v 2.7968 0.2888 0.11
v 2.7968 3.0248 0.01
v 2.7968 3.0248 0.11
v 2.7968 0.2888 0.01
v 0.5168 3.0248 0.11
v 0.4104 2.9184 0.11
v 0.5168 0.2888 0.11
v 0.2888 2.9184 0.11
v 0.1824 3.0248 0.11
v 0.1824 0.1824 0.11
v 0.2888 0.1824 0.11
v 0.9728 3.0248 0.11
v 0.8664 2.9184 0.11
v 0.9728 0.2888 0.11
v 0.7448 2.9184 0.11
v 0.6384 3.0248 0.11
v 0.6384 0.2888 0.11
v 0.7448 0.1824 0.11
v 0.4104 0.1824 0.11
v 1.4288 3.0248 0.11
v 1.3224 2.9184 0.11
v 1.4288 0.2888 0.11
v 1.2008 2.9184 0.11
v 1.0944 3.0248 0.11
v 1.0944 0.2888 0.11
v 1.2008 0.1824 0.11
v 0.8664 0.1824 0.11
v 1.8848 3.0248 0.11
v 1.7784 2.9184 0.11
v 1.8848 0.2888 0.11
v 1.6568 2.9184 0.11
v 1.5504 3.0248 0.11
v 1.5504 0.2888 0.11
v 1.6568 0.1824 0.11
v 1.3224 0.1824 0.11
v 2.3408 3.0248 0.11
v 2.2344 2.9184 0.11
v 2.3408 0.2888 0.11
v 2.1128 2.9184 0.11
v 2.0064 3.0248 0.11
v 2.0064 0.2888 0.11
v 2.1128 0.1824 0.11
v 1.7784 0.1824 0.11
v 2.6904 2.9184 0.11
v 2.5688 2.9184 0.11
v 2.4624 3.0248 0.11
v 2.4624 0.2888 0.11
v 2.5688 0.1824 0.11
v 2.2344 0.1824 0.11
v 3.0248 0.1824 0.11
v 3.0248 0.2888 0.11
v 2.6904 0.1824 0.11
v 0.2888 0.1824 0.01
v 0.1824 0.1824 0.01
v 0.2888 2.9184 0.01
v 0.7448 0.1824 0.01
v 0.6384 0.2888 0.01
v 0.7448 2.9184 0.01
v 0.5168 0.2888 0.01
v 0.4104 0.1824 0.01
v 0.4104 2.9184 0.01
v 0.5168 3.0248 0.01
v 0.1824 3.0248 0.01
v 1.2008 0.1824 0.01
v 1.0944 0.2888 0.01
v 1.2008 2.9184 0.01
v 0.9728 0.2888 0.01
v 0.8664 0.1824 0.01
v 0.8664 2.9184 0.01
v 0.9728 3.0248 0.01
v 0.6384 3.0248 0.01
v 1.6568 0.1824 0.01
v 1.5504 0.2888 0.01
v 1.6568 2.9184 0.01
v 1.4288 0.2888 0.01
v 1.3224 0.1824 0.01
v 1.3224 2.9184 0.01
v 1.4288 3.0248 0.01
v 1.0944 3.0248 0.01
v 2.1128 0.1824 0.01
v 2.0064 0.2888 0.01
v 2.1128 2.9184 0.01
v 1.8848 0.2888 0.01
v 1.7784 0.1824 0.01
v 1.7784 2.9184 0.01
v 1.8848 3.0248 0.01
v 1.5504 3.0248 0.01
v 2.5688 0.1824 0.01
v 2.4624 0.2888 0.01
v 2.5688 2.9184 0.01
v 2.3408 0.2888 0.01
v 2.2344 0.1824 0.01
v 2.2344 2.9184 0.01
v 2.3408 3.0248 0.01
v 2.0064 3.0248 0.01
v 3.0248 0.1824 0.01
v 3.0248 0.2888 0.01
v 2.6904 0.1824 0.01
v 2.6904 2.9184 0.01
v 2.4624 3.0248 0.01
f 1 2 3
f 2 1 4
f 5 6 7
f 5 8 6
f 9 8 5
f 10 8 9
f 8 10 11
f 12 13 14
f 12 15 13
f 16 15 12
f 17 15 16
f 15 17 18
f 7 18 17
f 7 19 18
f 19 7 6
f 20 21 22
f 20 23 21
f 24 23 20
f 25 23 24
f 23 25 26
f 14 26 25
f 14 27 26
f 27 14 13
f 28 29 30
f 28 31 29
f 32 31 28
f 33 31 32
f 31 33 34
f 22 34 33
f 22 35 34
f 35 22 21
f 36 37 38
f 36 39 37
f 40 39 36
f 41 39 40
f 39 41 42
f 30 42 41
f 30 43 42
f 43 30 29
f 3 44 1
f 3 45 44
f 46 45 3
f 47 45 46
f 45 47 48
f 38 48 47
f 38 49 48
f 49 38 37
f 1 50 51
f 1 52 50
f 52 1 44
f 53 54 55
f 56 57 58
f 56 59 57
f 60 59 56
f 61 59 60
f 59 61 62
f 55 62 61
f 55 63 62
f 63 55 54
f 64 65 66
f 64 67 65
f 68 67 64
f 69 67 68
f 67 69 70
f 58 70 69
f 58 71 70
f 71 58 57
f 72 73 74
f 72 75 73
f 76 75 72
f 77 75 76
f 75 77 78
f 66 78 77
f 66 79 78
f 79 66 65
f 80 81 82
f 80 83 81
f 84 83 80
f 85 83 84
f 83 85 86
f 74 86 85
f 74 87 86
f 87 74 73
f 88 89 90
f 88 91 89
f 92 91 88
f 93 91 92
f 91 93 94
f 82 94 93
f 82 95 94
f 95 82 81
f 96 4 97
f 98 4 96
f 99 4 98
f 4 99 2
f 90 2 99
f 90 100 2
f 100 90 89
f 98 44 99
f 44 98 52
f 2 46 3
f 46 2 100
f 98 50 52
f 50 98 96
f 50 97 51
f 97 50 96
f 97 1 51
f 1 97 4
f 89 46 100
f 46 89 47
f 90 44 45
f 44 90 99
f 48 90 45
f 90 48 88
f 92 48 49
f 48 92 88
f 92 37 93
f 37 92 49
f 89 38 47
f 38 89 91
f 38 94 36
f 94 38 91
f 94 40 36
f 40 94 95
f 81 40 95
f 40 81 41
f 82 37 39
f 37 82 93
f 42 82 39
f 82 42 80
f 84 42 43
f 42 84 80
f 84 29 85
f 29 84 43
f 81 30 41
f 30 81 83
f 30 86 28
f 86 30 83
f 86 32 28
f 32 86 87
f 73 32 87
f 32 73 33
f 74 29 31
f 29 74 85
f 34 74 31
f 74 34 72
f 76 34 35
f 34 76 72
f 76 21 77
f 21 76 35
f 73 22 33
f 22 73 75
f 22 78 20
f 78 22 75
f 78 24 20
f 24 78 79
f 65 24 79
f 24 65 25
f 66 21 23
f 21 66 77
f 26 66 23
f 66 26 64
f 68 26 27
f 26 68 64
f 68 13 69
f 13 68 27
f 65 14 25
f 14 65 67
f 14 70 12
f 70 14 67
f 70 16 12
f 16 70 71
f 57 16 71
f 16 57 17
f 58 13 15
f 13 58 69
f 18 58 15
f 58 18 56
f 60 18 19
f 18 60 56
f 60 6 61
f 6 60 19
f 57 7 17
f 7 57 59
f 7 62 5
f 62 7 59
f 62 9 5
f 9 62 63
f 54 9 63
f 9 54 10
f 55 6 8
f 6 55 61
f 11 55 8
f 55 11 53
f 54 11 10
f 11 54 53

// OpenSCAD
use <routing.scad>

px = 7.6e-3;
layer = 10e-3;
lpv = 20;

module valve_20px_1(xpos, ypos, zpos, orientation)
{
    
    // Parameteres
    h_fluid = 2*layer;
    t_memb = layer;
    h_air = 4*layer;
    h_total = h_fluid + t_memb + h_air; // 7*layer
    d_valve = 20*px;
    
    // Valve connection channels
    xychan0 = 6*px;
    xychan = 8*px;
    hchan = 5*layer;
    hchan_px = 8*px;
    wchan = 8*px;

    dimm        =   [  
                        [[0, 0], [-wchan/2, wchan/2], [0, hchan]], // 0
                        [[-wchan/2, wchan/2], [0, 0], [0, hchan]], // 1
                        [[-xychan/2, xychan/2], [-xychan/2, xychan/2], [0, 0]], // 2
                        [[-xychan0/2, xychan0/2], [-xychan0/2, xychan0/2], [0, 0]], // 3
                        [[-xychan/2, xychan/2], [0, hchan_px], [0, 0]], // 4
                    ];
                    
    overlap_v_xy  = 2*px;
    
    module obj(){
        // Fluid compartment
        color("CadetBlue")
        cylinder(d = d_valve, h = h_fluid);
        
        // Air compartment
        color("SteelBlue")
        translate([0,0,h_fluid + t_memb])
        cylinder(d = d_valve, h = h_air);    
            
        // Fluid in channel connection
        pt_fluid_in         = [0, -d_valve/2 + overlap_v_xy, 1*layer - hchan];
        pt_fluid_in_next    = [
                                ["+y", -21*px, 1],
                              ];
        color("Blue")
        routing(pt_fluid_in,pt_fluid_in_next, dimm);
        
        // Fluid out channel connection
        pt_fluid_out        = [0, d_valve/2 - overlap_v_xy, 1*layer - hchan];
        pt_fluid_out_next   = [
                                ["+y", 21*px, 1],
                              ];
        color("Red")
        routing(pt_fluid_out,pt_fluid_out_next, dimm);
        
        // Air control channel connection
        pt_air_control      = [-d_valve/2 - xychan/2 + 6*px, 0, h_total];
        pt_air_control_next = [
                                ["+zx", [9*layer, -21*px]],
                              ];
        
        color("Red")
        routing(pt_air_control,pt_air_control_next, dimm);
        
        // Air flushing channel connection
        pt_air_flush        = [d_valve/2 + xychan/2 - 6*px, 0, h_total];
        pt_air_flush_next   = [
                                ["+zx", [9*layer, 21*px]],
                              ];
        color("Blue")
        routing(pt_air_flush,pt_air_flush_next, dimm);
    }
    
    if (orientation == "N"){
        rotate(270)
        translate([-30*px*2 - ypos*px, 30*px*2 + xpos*px, 4*layer + zpos*layer])
        obj();
    }
    if (orientation == "FN"){
        mirror([1, 0 , 0])
        rotate(270)
        translate([-30*px*2 - ypos*px, -30*px*2 - xpos*px, 4*layer + zpos*layer])
        obj();
    }
    if (orientation == "FS"){
        mirror([0, 1, 0])
        rotate(270)
        translate([30*px*2 + ypos*px, 30*px*2 + xpos*px, 4*layer + zpos*layer])
        obj();
    }
    if (orientation == "S"){
        mirror([0, 1, 0])
        mirror([1, 0 , 0])
        rotate(270)
        translate([30*px*2 + ypos*px, -30*px*2 - xpos*px, 4*layer + zpos*layer])
        obj();
    }
    
}
module valve_20px4way_0(xpos, ypos, zpos, orientation)
{
    
    // Parameteres
    h_fluid = 2*layer;
    t_memb = layer;
    h_air = 4*layer;
    h_total = h_fluid + t_memb + h_air; // 7*layer
    d_valve = 20*px;
    
    // Valve connection channels
    xychan0 = 6*px;
    xychan = 8*px;
    hchan = 5*layer;
    hchan_px = 8*px;
    wchan = 8*px;

    dimm        =   [  
                        [[0, 0], [-wchan/2, wchan/2], [0, hchan]], // 0
                        [[-wchan/2, wchan/2], [0, 0], [0, hchan]], // 1
                        [[-xychan/2, xychan/2], [-xychan/2, xychan/2], [0, 0]], // 2
                        [[-xychan0/2, xychan0/2], [-xychan0/2, xychan0/2], [0, 0]], // 3
                        [[-xychan/2, xychan/2], [0, hchan_px], [0, 0]], // 4
                    ];
                    
    overlap_v_xy  = 2*px;
    
    module obj(){
        // Fluid compartment
        color("CadetBlue")
        cylinder(d = d_valve, h = h_fluid);
        
        // Air compartment
        color("SteelBlue")
        translate([0,0,h_fluid + t_memb])
        cylinder(d = d_valve, h = h_air);    
            
        // Fluid in channel connection
        pt_fluid_in         = [0, -d_valve/2 + overlap_v_xy, 1*layer - hchan];
        pt_fluid_in_next    = [
                                ["+y", -21*px, 1],
                              ];
        color("Blue")
        routing(pt_fluid_in,pt_fluid_in_next, dimm);
        
        // Fluid out channel connection
        pt_fluid_out        = [0, d_valve/2 - overlap_v_xy, 1*layer - hchan];
        pt_fluid_out_next   = [
                                ["+y", 21*px, 1],
                              ];
        color("Red")
        routing(pt_fluid_out,pt_fluid_out_next, dimm);
        
        rotate(90){
            // Fluid in channel connection
            pt_fluid_in         =   [0, -d_valve/2 + overlap_v_xy, 1*layer - hchan];
            pt_fluid_in_next    =   [
                                        ["+y", -21*px, 1],
                                    ];
            
            routing(pt_fluid_in,pt_fluid_in_next, dimm);
        
            // Fluid out channel connection
            pt_fluid_out        =   [0, d_valve/2 - overlap_v_xy, 1*layer - hchan];
            pt_fluid_out_next   =   [
                                        ["+y", 21*px, 1],
                                    ];
            
            routing(pt_fluid_out,pt_fluid_out_next, dimm);
        }
        
        // Air control channel connection
        pt_air_control      = [-d_valve/2 - xychan/2 + 6*px, 0, h_total];
        pt_air_control_next = [
                                ["+zx", [9*layer, -21*px]],
                              ];
        
        color("Red")
        routing(pt_air_control,pt_air_control_next, dimm);
        
        // Air flushing channel connection
        pt_air_flush        = [d_valve/2 + xychan/2 - 6*px, 0, h_total];
        pt_air_flush_next   = [
                                ["+zx", [9*layer, 21*px]],
                              ];
        color("Blue")
        routing(pt_air_flush,pt_air_flush_next, dimm);
    }
    
    if (orientation == "N"){
        rotate(270)
        translate([-25*px*2 - ypos*px, 25*px*2 + xpos*px, 4*layer + zpos*layer])
        obj();
    }
    if (orientation == "FN"){
        mirror([1, 0 , 0])
        rotate(270)
        translate([-25*px*2 - ypos*px, -25*px*2 - xpos*px, 4*layer + zpos*layer])
        obj();
    }
    if (orientation == "FS"){
        mirror([0, 1, 0])
        rotate(270)
        translate([25*px*2 + ypos*px, 25*px*2 + xpos*px, 4*layer + zpos*layer])
        obj();
    }
    if (orientation == "S"){
        mirror([0, 1, 0])
        mirror([1, 0 , 0])
        rotate(270)
        translate([25*px*2 + ypos*px, -25*px*2 - xpos*px, 4*layer + zpos*layer])
        obj();
    }
    
}
module serpentine_300px_0(xpos, ypos, zpos, orientation)
{
    
    // Sub-modules
    module obj(){
        translate([23*px, 23*px, 0])       
        routing(
            dimm = [
                    [[0, 0], [0, 14*px], [0, 10*layer]],
                    [[0, 14*px], [0, 0], [0, 10*layer]]
                    ],
            p0 = [0, 0, 0],
            pf = [
                    ["+yx", [360*px, 30*px], [1, 0]],
                    ["+yx", [-360*px, 30*px], [1, 0]],
                    ["+yx", [360*px, 30*px], [1, 0]],
                    ["+yx", [-360*px, 30*px], [1, 0]],
                    ["+yx", [360*px, 30*px], [1, 0]],
                    ["+yx", [-360*px, 30*px], [1, 0]],
                    ["+yx", [360*px, 30*px], [1, 0]],
                    ["+yx", [-360*px, 30*px], [1, 0]],
                    ["+yx", [360*px, 30*px], [1, 0]],
                    ["+yx", [-360*px, 30*px], [1, 0]],
                    ["+yx", [360*px, 30*px], [1, 0]],
                    ["+yx", [-360*px, 30*px+14*px], [1, 0]]
                    ]
        );
        
    }
    
    if (orientation == "N"){
        translate([xpos*px, ypos*px, zpos*layer])
        obj();
    }
        if (orientation == "FN"){
        mirror([1, 0, 0])
        translate([-14*30*px - xpos*px, ypos*px, zpos*layer])
        obj();
    }
    if (orientation == "FS"){
        mirror([0, 1, 0])
        translate([xpos*px, -14*30*px - ypos*px, zpos*layer])
        obj();
    }
    if (orientation == "S"){
        mirror([0, 1, 0])
        mirror([1, 0, 0])
        translate([-14*30*px - xpos*px, -14*30*px - ypos*px, zpos*layer])
        obj();
    }
    
}
serpentine_300px_0(1,1,1,"N");

module serpentine_100px_0(xpos, ypos, zpos, orientation)
{
    
    // Sub-modules
    module obj(){
        translate([23*px, 23*px, 0])       
        routing(
            dimm = [
                    [[0, 0], [0, 14*px], [0, 10*layer]],
                    [[0, 14*px], [0, 0], [0, 10*layer]]
                    ],
            p0 = [0, 0, 0],
            pf = [
                    ["+yx", [120*px, 30*px], [1, 0]],
                    ["+yx", [-120*px, 30*px], [1, 0]],
                    ["+yx", [120*px, 30*px], [1, 0]],
                    ["+yx", [-120*px, 30*px+14*px], [1, 0]]
                    ]
        );
        
    }
    
    if (orientation == "N"){
        translate([xpos*px, ypos*px, zpos*layer])
        obj();
    }
        if (orientation == "FN"){
        mirror([1, 0, 0])
        translate([-6*30*px - xpos*px, ypos*px, zpos*layer])
        obj();
    }
    if (orientation == "FS"){
        mirror([0, 1, 0])
        translate([xpos*px, -6*30*px - ypos*px, zpos*layer])
        obj();
    }
    if (orientation == "S"){
        mirror([0, 1, 0])
        mirror([1, 0, 0])
        translate([-6*30*px - xpos*px, -6*30*px - ypos*px, zpos*layer])
        obj();
    }
    
}
module serpentine_200_100px_0(xpos, ypos, zpos, orientation)
{
    
    // Sub-modules
    module obj(){
        translate([23*px, 23*px, 0])       
        routing(
            dimm = [
                    [[0, 0], [0, 14*px], [0, 10*layer]],
                    [[0, 14*px], [0, 0], [0, 10*layer]]
                    ],
            p0 = [0, 0, 0],
            pf = [
                    ["+yx", [120*px, 30*px], [1, 0]],
                    ["+yx", [-120*px, 30*px], [1, 0]],
                    ["+yx", [120*px, 30*px], [1, 0]],                 
                    ["+yx", [-120*px, 30*px], [1, 0]],
                    ["+yx", [120*px, 30*px], [1, 0]],
                    ["+yx", [-120*px, 30*px], [1, 0]],
                    ["+yx", [120*px, 30*px], [1, 0]],
                    ["+yx", [-120*px, 30*px+14*px], [1, 0]],
                    ]
        );
        
    }
    
    if (orientation == "N"){
        translate([xpos*px, ypos*px, zpos*layer])
        obj();
    }
        if (orientation == "FN"){
        mirror([1, 0, 0])
        translate([-10*30*px - xpos*px, ypos*px, zpos*layer])
        obj();
    }
    if (orientation == "FS"){
        mirror([0, 1, 0])
        translate([xpos*px, -6*30*px - ypos*px, zpos*layer])
        obj();
    }
    if (orientation == "S"){
        mirror([0, 1, 0])
        mirror([1, 0, 0])
        translate([-10*30*px - xpos*px, -6*30*px - ypos*px, zpos*layer])
        obj();
    }
    
}
module serpentine_25px_0(xpos, ypos, zpos, orientation)
{
    
    // Sub-modules
    module obj(){
        translate([23*px, 23*px, 0])       
        routing(
            dimm = [
                    [[0, 0], [0, 14*px], [0, 10*layer]],
                    [[0, 14*px], [0, 0], [0, 10*layer]]
                    ],
            p0 = [0, 0, 0],
            pf = [
                    ["+yx", [30*px, 30*px+14*px], [1, 0]]
                    ]
        );
        
    }
    
    if (orientation == "N"){
        translate([xpos*px, ypos*px, zpos*layer])
        obj();
    }
        if (orientation == "FN"){
        mirror([1, 0, 0])
        translate([-3*30*px - xpos*px, ypos*px, zpos*layer])
        obj();
    }
    if (orientation == "FS"){
        mirror([0, 1, 0])
        translate([xpos*px, -3*30*px - ypos*px, zpos*layer])
        obj();
    }
    if (orientation == "S"){
        mirror([0, 1, 0])
        mirror([1, 0, 0])
        translate([-3*30*px - xpos*px, -3*30*px - ypos*px, zpos*layer])
        obj();
    }
    
}
module serpentine_150px_0(xpos, ypos, zpos, orientation)
{
    
    // Sub-modules
    module obj(){
        translate([23*px, 23*px, 0])       
        routing(
            dimm = [
                    [[0, 0], [0, 14*px], [0, 10*layer]],
                    [[0, 14*px], [0, 0], [0, 10*layer]]
                    ],
            p0 = [0, 0, 0],
            pf = [
                    ["+yx", [180*px, 30*px], [1, 0]],
                    ["+yx", [-180*px, 30*px], [1, 0]],
                    ["+yx", [180*px, 30*px], [1, 0]],
                    ["+yx", [-180*px, 30*px], [1, 0]],
                    ["+yx", [180*px, 30*px], [1, 0]],
                    ["+yx", [-180*px, 30*px+14*px], [1, 0]]
                    ]
        );
        
    }
    
    if (orientation == "N"){
        translate([xpos*px, ypos*px, zpos*layer])
        obj();
    }
        if (orientation == "FN"){
        mirror([1, 0, 0])
        translate([-8*30*px - xpos*px, ypos*px, zpos*layer])
        obj();
    }
    if (orientation == "FS"){
        mirror([0, 1, 0])
        translate([xpos*px, -8*30*px - ypos*px, zpos*layer])
        obj();
    }
    if (orientation == "S"){
        mirror([0, 1, 0])
        mirror([1, 0, 0])
        translate([-8*30*px - xpos*px, -8*30*px - ypos*px, zpos*layer])
        obj();
    }
    
}
module serpentine_200px_0(xpos, ypos, zpos, orientation)
{
    
    // Sub-modules
    module obj(){
        translate([23*px, 23*px, 0])       
        routing(
            dimm = [
                    [[0, 0], [0, 14*px], [0, 10*layer]],
                    [[0, 14*px], [0, 0], [0, 10*layer]]
                    ],
            p0 = [0, 0, 0],
            pf = [
                    ["+yx", [240*px, 30*px], [1, 0]],
                    ["+yx", [-240*px, 30*px], [1, 0]],
                    ["+yx", [240*px, 30*px], [1, 0]],
                    ["+yx", [-240*px, 30*px], [1, 0]],
                    ["+yx", [240*px, 30*px], [1, 0]],
                    ["+yx", [-240*px, 30*px], [1, 0]],
                    ["+yx", [240*px, 30*px], [1, 0]],
                    ["+yx", [-240*px, 30*px+14*px], [1, 0]]
                    ]
        );
        
    }
    
    if (orientation == "N"){
        translate([xpos*px, ypos*px, zpos*layer])
        obj();
    }
        if (orientation == "FN"){
        mirror([1, 0, 0])
        translate([-10*30*px - xpos*px, ypos*px, zpos*layer])
        obj();
    }
    if (orientation == "FS"){
        mirror([0, 1, 0])
        translate([xpos*px, -10*30*px - ypos*px, zpos*layer])
        obj();
    }
    if (orientation == "S"){
        mirror([0, 1, 0])
        mirror([1, 0, 0])
        translate([-10*30*px - xpos*px, -10*30*px - ypos*px, zpos*layer])
        obj();
    }
    
}
module serpentine_300px_4(xpos, ypos, zpos, orientation)
{
    
    // Sub-modules
    module obj(){
        translate([23*px+30*px, 23*px, 0]){     
            routing(
                dimm = [
                        [[0, 0], [0, 14*px], [0, 10*layer]],
                        [[0, 14*px], [0, 0], [0, 10*layer]],
                        [[0, 14*px], [0, 14*px], [0, 0]]
                        ],
                p0 = [-30*px, 0, lpv*layer],
                pf = [
                        ["+x", 30*px, 0],
                        ["+yx", [360*px, 30*px], [1, 0]],
                        ["+yx", [-360*px, 30*px], [1, 0]],
                        ["+yx", [360*px, 30*px], [1, 0]],
                        ["+yx", [-360*px, 30*px], [1, 0]],
                        ["+yx", [360*px, 30*px], [1, 0]],
                        ["+yx", [-360*px, 30*px], [1, 0]],
                        ["+yx", [360*px, 30*px], [1, 0]],
                        ["+yx", [-360*px, 30*px], [1, 0]],
                        ["+yx", [360*px, 30*px], [1, 0]],
                        ["+yx", [-360*px, 30*px], [1, 0]],
                        ["+yx", [360*px, 30*px], [1, 0]],
                        ["+yz", [-360*px, lpv*layer], [1, 2]]
                        ]
            );
            routing(
                dimm = [
                        [[0, 0], [0, 14*px], [0, 10*layer]],
                        [[0, 14*px], [0, 0], [0, 10*layer]],
                        [[0, 14*px], [0, 14*px], [0, 0]]
                        ],
                p0 = [11*30*px, 0, 2*lpv*layer],
                pf = [
                        ["+yx", [360*px, -30*px], [1, 0]],
                        ["+yx", [-360*px, -30*px], [1, 0]],
                        ["+yx", [360*px, -30*px], [1, 0]],
                        ["+yx", [-360*px, -30*px], [1, 0]],
                        ["+yx", [360*px, -30*px], [1, 0]],
                        ["+yx", [-360*px, -30*px], [1, 0]],
                        ["+yx", [360*px, -30*px], [1, 0]],
                        ["+yx", [-360*px, -30*px], [1, 0]],
                        ["+yx", [360*px, -30*px], [1, 0]],
                        ["+yx", [-360*px, -30*px], [1, 0]],
                        ["+yx", [360*px, -30*px], [1, 0]],
                        ["+yz", [-360*px, lpv*layer], [1, 2]]
                        ]
            );
            routing(
                dimm = [
                        [[0, 0], [0, 14*px], [0, 10*layer]],
                        [[0, 14*px], [0, 0], [0, 10*layer]],
                        [[0, 14*px], [0, 14*px], [0, 0]]
                        ],
                p0 = [0, 0, 3*lpv*layer],
                pf = [
                        ["+yx", [360*px, 30*px], [1, 0]],
                        ["+yx", [-360*px, 30*px], [1, 0]],
                        ["+yx", [360*px, 30*px], [1, 0]],
                        ["+yx", [-360*px, 30*px], [1, 0]],
                        ["+yx", [360*px, 30*px], [1, 0]],
                        ["+yx", [-360*px, 30*px], [1, 0]],
                        ["+yx", [360*px, 30*px], [1, 0]],
                        ["+yx", [-360*px, 30*px], [1, 0]],
                        ["+yx", [360*px, 30*px], [1, 0]],
                        ["+yx", [-360*px, 30*px], [1, 0]],
                        ["+yx", [360*px, 30*px], [1, 0]],
                        ["+yz", [-360*px, lpv*layer], [1, 2]]
                        ]
            );
            routing(
                dimm = [
                        [[0, 0], [0, 14*px], [0, 10*layer]],
                        [[0, 14*px], [0, 0], [0, 10*layer]],
                        [[0, 14*px], [0, 14*px], [0, 0]]
                        ],
                p0 = [11*30*px, 0, 4*lpv*layer],
                pf = [
                        ["+yx", [360*px, -30*px], [1, 0]],
                        ["+yx", [-360*px, -30*px], [1, 0]],
                        ["+yx", [360*px, -30*px], [1, 0]],
                        ["+yx", [-360*px, -30*px], [1, 0]],
                        ["+yx", [360*px, -30*px], [1, 0]],
                        ["+yx", [-360*px, -30*px], [1, 0]],
                        ["+yx", [360*px, -30*px], [1, 0]],
                        ["+yx", [-360*px, -30*px], [1, 0]],
                        ["+yx", [360*px, -30*px], [1, 0]],
                        ["+yx", [-360*px, -30*px], [1, 0]],
                        ["+yx", [360*px, -30*px], [1, 0]],
                        ["+yz", [-360*px, lpv*layer], [1, 2]]
                        ]
            );
            routing(
                dimm = [
                        [[0, 0], [0, 14*px], [0, 10*layer]],
                        [[0, 14*px], [0, 0], [0, 10*layer]],
                        [[0, 14*px], [0, 14*px], [0, 0]]
                        ],
                p0 = [0, 0, 5*lpv*layer],
                pf = [
                        ["+yx", [360*px, 30*px], [1, 0]],
                        ["+yx", [-360*px, 30*px], [1, 0]],
                        ["+yx", [360*px, 30*px], [1, 0]],
                        ["+yx", [-360*px, 30*px], [1, 0]],
                        ["+yx", [360*px, 30*px], [1, 0]],
                        ["+yx", [-360*px, 30*px], [1, 0]],
                        ["+yx", [360*px, 30*px], [1, 0]],
                        ["+yx", [-360*px, 30*px], [1, 0]],
                        ["+yx", [360*px, 30*px], [1, 0]],
                        ["+yx", [-360*px, 30*px], [1, 0]],
                        ["+yx", [360*px, 30*px], [1, 0]],
                        ["+yx", [-360*px, 25*px+14*px], [1, 0]]
                        ]
            );
        }
        
    }
    
    if (orientation == "N"){
        translate([xpos*px, ypos*px, zpos*layer])
        obj();
    }
        if (orientation == "FN"){
        mirror([1, 0, 0])
        translate([-15*30*px - xpos*px, ypos*px, zpos*layer])
        obj();
    }
    if (orientation == "FS"){
        mirror([0, 1, 0])
        translate([xpos*px, -14*30*px - ypos*px, zpos*layer])
        obj();
    }
    if (orientation == "S"){
        mirror([0, 1, 0])
        mirror([1, 0, 0])
        translate([-15*30*px - xpos*px, -14*30*px - ypos*px, zpos*layer])
        obj();
    }
    
}
module serpentine_75px_0(xpos, ypos, zpos, orientation)
{
    
    // Sub-modules
    module obj(){
        translate([23*px, 23*px, 0])       
        routing(
            dimm = [
                    [[0, 0], [0, 14*px], [0, 10*layer]],
                    [[0, 14*px], [0, 0], [0, 10*layer]]
                    ],
            p0 = [0, 0, 0],
            pf = [
                    ["+yx", [90*px, 30*px], [1, 0]],
                    ["+yx", [-90*px, 30*px], [1, 0]],
                    ["+yx", [90*px, 30*px+14*px], [1, 0]]
                    ]
        );
        
    }
    
    if (orientation == "N"){
        translate([xpos*px, ypos*px, zpos*layer])
        obj();
    }
        if (orientation == "FN"){
        mirror([1, 0, 0])
        translate([-5*30*px - xpos*px, ypos*px, zpos*layer])
        obj();
    }
    if (orientation == "FS"){
        mirror([0, 1, 0])
        translate([xpos*px, -5*30*px - ypos*px, zpos*layer])
        obj();
    }
    if (orientation == "S"){
        mirror([0, 1, 0])
        mirror([1, 0, 0])
        translate([-5*30*px - xpos*px, -5*30*px - ypos*px, zpos*layer])
        obj();
    }
    
}
module serpentine_300px_1(xpos, ypos, zpos, orientation)
{
    
    // Sub-modules
    module obj(){
        translate([23*px+30*px, 23*px, 0]){     
            routing(
                dimm = [
                        [[0, 0], [0, 14*px], [0, 10*layer]],
                        [[0, 14*px], [0, 0], [0, 10*layer]],
                        [[0, 14*px], [0, 14*px], [0, 0]]
                        ],
                p0 = [0, 0, lpv*layer],
                pf = [
                        ["+yx", [360*px, 30*px], [1, 0]],
                        ["+yx", [-360*px, 30*px], [1, 0]],
                        ["+yx", [360*px, 30*px], [1, 0]],
                        ["+yx", [-360*px, 30*px], [1, 0]],
                        ["+yx", [360*px, 30*px], [1, 0]],
                        ["+yx", [-360*px, 30*px], [1, 0]],
                        ["+yx", [360*px, 30*px], [1, 0]],
                        ["+yx", [-360*px, 30*px], [1, 0]],
                        ["+yx", [360*px, 30*px], [1, 0]],
                        ["+yx", [-360*px, 30*px], [1, 0]],
                        ["+yx", [360*px, 30*px], [1, 0]],
                        ["+yz", [-360*px, lpv*layer], [1, 2]]
                        ]
            );
            routing(
                dimm = [
                        [[0, 0], [0, 14*px], [0, 10*layer]],
                        [[0, 14*px], [0, 0], [0, 10*layer]],
                        [[0, 14*px], [0, 14*px], [0, 0]]
                        ],
                p0 = [11*30*px, 0, 2*lpv*layer],
                pf = [
                        ["+yx", [360*px, -30*px], [1, 0]],
                        ["+yx", [-360*px, -30*px], [1, 0]],
                        ["+yx", [360*px, -30*px], [1, 0]],
                        ["+yx", [-360*px, -30*px], [1, 0]],
                        ["+yx", [360*px, -30*px], [1, 0]],
                        ["+yx", [-360*px, -30*px], [1, 0]],
                        ["+yx", [360*px, -30*px], [1, 0]],
                        ["+yx", [-360*px, -30*px], [1, 0]],
                        ["+yx", [360*px, -30*px], [1, 0]],
                        ["+yx", [-360*px, -30*px], [1, 0]],
                        ["+yx", [360*px, -30*px], [1, 0]],
                        ["+yx", [-360*px, -30*px], [1, 0]]
                        ]
            );
        }
        
    }
    
    if (orientation == "N"){
        translate([xpos*px, ypos*px, zpos*layer])
        obj();
    }
        if (orientation == "FN"){
        mirror([1, 0, 0])
        translate([-14*30*px - xpos*px, ypos*px, zpos*layer])
        obj();
    }
    if (orientation == "FS"){
        mirror([0, 1, 0])
        translate([xpos*px, -14*30*px - ypos*px, zpos*layer])
        obj();
    }
    if (orientation == "S"){
        mirror([0, 1, 0])
        mirror([1, 0, 0])
        translate([-14*30*px - xpos*px, -14*30*px - ypos*px, zpos*layer])
        obj();
    }
    
}
module serpentine_300px_3(xpos, ypos, zpos, orientation)
{
    
    // Sub-modules
    module obj(){
        translate([23*px+30*px, 23*px, 0]){     
            routing(
                dimm = [
                        [[0, 0], [0, 14*px], [0, 10*layer]],
                        [[0, 14*px], [0, 0], [0, 10*layer]],
                        [[0, 14*px], [0, 14*px], [0, 0]]
                        ],
                p0 = [0, 0, lpv*layer],
                pf = [
                        ["+yx", [360*px, 30*px], [1, 0]],
                        ["+yx", [-360*px, 30*px], [1, 0]],
                        ["+yx", [360*px, 30*px], [1, 0]],
                        ["+yx", [-360*px, 30*px], [1, 0]],
                        ["+yx", [360*px, 30*px], [1, 0]],
                        ["+yx", [-360*px, 30*px], [1, 0]],
                        ["+yx", [360*px, 30*px], [1, 0]],
                        ["+yx", [-360*px, 30*px], [1, 0]],
                        ["+yx", [360*px, 30*px], [1, 0]],
                        ["+yx", [-360*px, 30*px], [1, 0]],
                        ["+yx", [360*px, 30*px], [1, 0]],
                        ["+yz", [-360*px, lpv*layer], [1, 2]]
                        ]
            );
            routing(
                dimm = [
                        [[0, 0], [0, 14*px], [0, 10*layer]],
                        [[0, 14*px], [0, 0], [0, 10*layer]],
                        [[0, 14*px], [0, 14*px], [0, 0]]
                        ],
                p0 = [11*30*px, 0, 2*lpv*layer],
                pf = [
                        ["+yx", [360*px, -30*px], [1, 0]],
                        ["+yx", [-360*px, -30*px], [1, 0]],
                        ["+yx", [360*px, -30*px], [1, 0]],
                        ["+yx", [-360*px, -30*px], [1, 0]],
                        ["+yx", [360*px, -30*px], [1, 0]],
                        ["+yx", [-360*px, -30*px], [1, 0]],
                        ["+yx", [360*px, -30*px], [1, 0]],
                        ["+yx", [-360*px, -30*px], [1, 0]],
                        ["+yx", [360*px, -30*px], [1, 0]],
                        ["+yx", [-360*px, -30*px], [1, 0]],
                        ["+yx", [360*px, -30*px], [1, 0]],
                        ["+yz", [-360*px, lpv*layer], [1, 2]]
                        ]
            );
            routing(
                dimm = [
                        [[0, 0], [0, 14*px], [0, 10*layer]],
                        [[0, 14*px], [0, 0], [0, 10*layer]],
                        [[0, 14*px], [0, 14*px], [0, 0]]
                        ],
                p0 = [0, 0, 3*lpv*layer],
                pf = [
                        ["+yx", [360*px, 30*px], [1, 0]],
                        ["+yx", [-360*px, 30*px], [1, 0]],
                        ["+yx", [360*px, 30*px], [1, 0]],
                        ["+yx", [-360*px, 30*px], [1, 0]],
                        ["+yx", [360*px, 30*px], [1, 0]],
                        ["+yx", [-360*px, 30*px], [1, 0]],
                        ["+yx", [360*px, 30*px], [1, 0]],
                        ["+yx", [-360*px, 30*px], [1, 0]],
                        ["+yx", [360*px, 30*px], [1, 0]],
                        ["+yx", [-360*px, 30*px], [1, 0]],
                        ["+yx", [360*px, 30*px], [1, 0]],
                        ["+yz", [-360*px, lpv*layer], [1, 2]]
                        ]
            );
            routing(
                dimm = [
                        [[0, 0], [0, 14*px], [0, 10*layer]],
                        [[0, 14*px], [0, 0], [0, 10*layer]],
                        [[0, 14*px], [0, 14*px], [0, 0]]
                        ],
                p0 = [11*30*px, 0, 4*lpv*layer],
                pf = [
                        ["+yx", [360*px, -30*px], [1, 0]],
                        ["+yx", [-360*px, -30*px], [1, 0]],
                        ["+yx", [360*px, -30*px], [1, 0]],
                        ["+yx", [-360*px, -30*px], [1, 0]],
                        ["+yx", [360*px, -30*px], [1, 0]],
                        ["+yx", [-360*px, -30*px], [1, 0]],
                        ["+yx", [360*px, -30*px], [1, 0]],
                        ["+yx", [-360*px, -30*px], [1, 0]],
                        ["+yx", [360*px, -30*px], [1, 0]],
                        ["+yx", [-360*px, -30*px], [1, 0]],
                        ["+yx", [360*px, -30*px], [1, 0]],
                        ["+yx", [-360*px, -30*px], [1, 0]]
                        ]
            );
        }
        
    }
    
    if (orientation == "N"){
        translate([xpos*px, ypos*px, zpos*layer])
        obj();
    }
        if (orientation == "FN"){
        mirror([1, 0, 0])
        translate([-14*30*px - xpos*px, ypos*px, zpos*layer])
        obj();
    }
    if (orientation == "FS"){
        mirror([0, 1, 0])
        translate([xpos*px, -14*30*px - ypos*px, zpos*layer])
        obj();
    }
    if (orientation == "S"){
        mirror([0, 1, 0])
        mirror([1, 0, 0])
        translate([-14*30*px - xpos*px, -14*30*px - ypos*px, zpos*layer])
        obj();
    }
    
}
module serpentine_50px_0(xpos, ypos, zpos, orientation)
{
    
    // Sub-modules
    module obj(){
        translate([23*px, 23*px, 0])       
        routing(
            dimm = [
                    [[0, 0], [0, 14*px], [0, 10*layer]],
                    [[0, 14*px], [0, 0], [0, 10*layer]]
                    ],
            p0 = [0, 0, 0],
            pf = [
                    ["+yx", [60*px, 30*px], [1, 0]],
                    ["+yx", [-60*px, 30*px+14*px], [1, 0]]
                    ]
        );
        
    }
    
    if (orientation == "N"){
        translate([xpos*px, ypos*px, zpos*layer])
        obj();
    }
        if (orientation == "FN"){
        mirror([1, 0, 0])
        translate([-4*30*px - xpos*px, ypos*px, zpos*layer])
        obj();
    }
    if (orientation == "FS"){
        mirror([0, 1, 0])
        translate([xpos*px, -4*30*px - ypos*px, zpos*layer])
        obj();
    }
    if (orientation == "S"){
        mirror([0, 1, 0])
        mirror([1, 0, 0])
        translate([-4*30*px - xpos*px, -4*30*px - ypos*px, zpos*layer])
        obj();
    }
    
}
module serpentine_300px_2(xpos, ypos, zpos, orientation)
{
    
    // Sub-modules
    module obj(){
        translate([23*px+30*px, 23*px, 0]){     
            routing(
                dimm = [
                        [[0, 0], [0, 14*px], [0, 10*layer]],
                        [[0, 14*px], [0, 0], [0, 10*layer]],
                        [[0, 14*px], [0, 14*px], [0, 0]]
                        ],
                p0 = [-30*px, 0, lpv*layer],
                pf = [
                        ["+x", 30*px, 0],
                        ["+yx", [360*px, 30*px], [1, 0]],
                        ["+yx", [-360*px, 30*px], [1, 0]],
                        ["+yx", [360*px, 30*px], [1, 0]],
                        ["+yx", [-360*px, 30*px], [1, 0]],
                        ["+yx", [360*px, 30*px], [1, 0]],
                        ["+yx", [-360*px, 30*px], [1, 0]],
                        ["+yx", [360*px, 30*px], [1, 0]],
                        ["+yx", [-360*px, 30*px], [1, 0]],
                        ["+yx", [360*px, 30*px], [1, 0]],
                        ["+yx", [-360*px, 30*px], [1, 0]],
                        ["+yx", [360*px, 30*px], [1, 0]],
                        ["+yz", [-360*px, lpv*layer], [1, 2]]
                        ]
            );
            routing(
                dimm = [
                        [[0, 0], [0, 14*px], [0, 10*layer]],
                        [[0, 14*px], [0, 0], [0, 10*layer]],
                        [[0, 14*px], [0, 14*px], [0, 0]]
                        ],
                p0 = [11*30*px, 0, 2*lpv*layer],
                pf = [
                        ["+yx", [360*px, -30*px], [1, 0]],
                        ["+yx", [-360*px, -30*px], [1, 0]],
                        ["+yx", [360*px, -30*px], [1, 0]],
                        ["+yx", [-360*px, -30*px], [1, 0]],
                        ["+yx", [360*px, -30*px], [1, 0]],
                        ["+yx", [-360*px, -30*px], [1, 0]],
                        ["+yx", [360*px, -30*px], [1, 0]],
                        ["+yx", [-360*px, -30*px], [1, 0]],
                        ["+yx", [360*px, -30*px], [1, 0]],
                        ["+yx", [-360*px, -30*px], [1, 0]],
                        ["+yx", [360*px, -30*px], [1, 0]],
                        ["+yz", [-360*px, lpv*layer], [1, 2]]
                        ]
            );
            routing(
                dimm = [
                        [[0, 0], [0, 14*px], [0, 10*layer]],
                        [[0, 14*px], [0, 0], [0, 10*layer]],
                        [[0, 14*px], [0, 14*px], [0, 0]]
                        ],
                p0 = [0, 0, 3*lpv*layer],
                pf = [
                        ["+yx", [360*px, 30*px], [1, 0]],
                        ["+yx", [-360*px, 30*px], [1, 0]],
                        ["+yx", [360*px, 30*px], [1, 0]],
                        ["+yx", [-360*px, 30*px], [1, 0]],
                        ["+yx", [360*px, 30*px], [1, 0]],
                        ["+yx", [-360*px, 30*px], [1, 0]],
                        ["+yx", [360*px, 30*px], [1, 0]],
                        ["+yx", [-360*px, 30*px], [1, 0]],
                        ["+yx", [360*px, 30*px], [1, 0]],
                        ["+yx", [-360*px, 30*px], [1, 0]],
                        ["+yx", [360*px, 30*px], [1, 0]],
                        ["+yx", [-360*px, 30*px+14*px], [1, 0]]
                        ]
            );
        }
        
    }
    
    if (orientation == "N"){
        translate([xpos*px, ypos*px, zpos*layer])
        obj();
    }
        if (orientation == "FN"){
        mirror([1, 0, 0])
        translate([-15*30*px - xpos*px, ypos*px, zpos*layer])
        obj();
    }
    if (orientation == "FS"){
        mirror([0, 1, 0])
        translate([xpos*px, -14*30*px - ypos*px, zpos*layer])
        obj();
    }
    if (orientation == "S"){
        mirror([0, 1, 0])
        mirror([1, 0, 0])
        translate([-15*30*px - xpos*px, -14*30*px - ypos*px, zpos*layer])
        obj();
    }
    
}
module serpentine_200px_3(xpos, ypos, zpos, orientation)
{
    
    // Sub-modules
    module obj(){
        translate([23*px+30*px, 23*px, 0]){      
            routing(
                dimm = [
                        [[0, 0], [0, 14*px], [0, 10*layer]],
                        [[0, 14*px], [0, 0], [0, 10*layer]],
                        [[0, 14*px], [0, 14*px], [0, 0]]
                        ],
                p0 = [-30*px, 0, lpv*layer],
                pf = [
                        ["+x", 30*px, 0],
                        ["+yx", [240*px, 30*px], [1, 0]],
                        ["+yx", [-240*px, 30*px], [1, 0]],
                        ["+yx", [240*px, 30*px], [1, 0]],
                        ["+yx", [-240*px, 30*px], [1, 0]],
                        ["+yx", [240*px, 30*px], [1, 0]],
                        ["+yx", [-240*px, 30*px], [1, 0]],
                        ["+yx", [240*px, 30*px], [1, 0]],
                        ["+yz", [-240*px, lpv*layer], [1, 2]]
                        ]
            );
            routing(
                dimm = [
                        [[0, 0], [0, 14*px], [0, 10*layer]],
                        [[0, 14*px], [0, 0], [0, 10*layer]],
                        [[0, 14*px], [0, 14*px], [0, 0]]
                        ],
                p0 = [7*30*px, 0, 2*lpv*layer],
                pf = [
                        ["+yx", [240*px, -30*px], [1, 0]],
                        ["+yx", [-240*px, -30*px], [1, 0]],
                        ["+yx", [240*px, -30*px], [1, 0]],
                        ["+yx", [-240*px, -30*px], [1, 0]],
                        ["+yx", [240*px, -30*px], [1, 0]],
                        ["+yx", [-240*px, -30*px], [1, 0]],
                        ["+yx", [240*px, -30*px], [1, 0]],
                        ["+yz", [-240*px, lpv*layer], [1, 2]]
                        ]
            );
            routing(
                dimm = [
                        [[0, 0], [0, 14*px], [0, 10*layer]],
                        [[0, 14*px], [0, 0], [0, 10*layer]],
                        [[0, 14*px], [0, 14*px], [0, 0]]
                        ],
                p0 = [0, 0, 3*lpv*layer],
                pf = [
                        ["+yx", [240*px, 30*px], [1, 0]],
                        ["+yx", [-240*px, 30*px], [1, 0]],
                        ["+yx", [240*px, 30*px], [1, 0]],
                        ["+yx", [-240*px, 30*px], [1, 0]],
                        ["+yx", [240*px, 30*px], [1, 0]],
                        ["+yx", [-240*px, 30*px], [1, 0]],
                        ["+yx", [240*px, 30*px], [1, 0]],
                        ["+yz", [-240*px, lpv*layer], [1, 2]]
                        ]
            );
            routing(
                dimm = [
                        [[0, 0], [0, 14*px], [0, 10*layer]],
                        [[0, 14*px], [0, 0], [0, 10*layer]],
                        [[0, 14*px], [0, 14*px], [0, 0]]
                        ],
                p0 = [7*30*px, 0, 4*lpv*layer],
                pf = [
                        ["+yx", [240*px, -30*px], [1, 0]],
                        ["+yx", [-240*px, -30*px], [1, 0]],
                        ["+yx", [240*px, -30*px], [1, 0]],
                        ["+yx", [-240*px, -30*px], [1, 0]],
                        ["+yx", [240*px, -30*px], [1, 0]],
                        ["+yx", [-240*px, -30*px], [1, 0]],
                        ["+yx", [240*px, -30*px], [1, 0]],
                        ["+yx", [-240*px, -30*px], [1, 0]]
                        ]
            );
        }
        
    }
    
    if (orientation == "N"){
        translate([xpos*px, ypos*px, zpos*layer])
        obj();
    }
        if (orientation == "FN"){
        mirror([1, 0, 0])
        translate([-10*30*px - xpos*px, ypos*px, zpos*layer])
        obj();
    }
    if (orientation == "FS"){
        mirror([0, 1, 0])
        translate([xpos*px, -10*30*px - ypos*px, zpos*layer])
        obj();
    }
    if (orientation == "S"){
        mirror([0, 1, 0])
        mirror([1, 0, 0])
        translate([-10*30*px - xpos*px, -10*30*px - ypos*px, zpos*layer])
        obj();
    }
    
}
module diffmix_25px_0(xpos, ypos, zpos, orientation)
{
      
    // Channel Dimensions
    hchan = 10*layer;
    Wchan = 14*px;

    dim  = [
            [[0,0],[-Wchan/2,Wchan/2],[0,hchan]], // 0
            [[-Wchan/2,Wchan/2],[0,0],[0,hchan]], // 1
                    
           ];
    
    module obj(){
        pi_0 = [-7*px, 30*px, 0];
        pf_0 = [Wchan+16*px, 0, 0];
        connect_0 = [
                     ["+x", pf_0, 0]
                    ];
        routing(pi_0, connect_0, dim);
        
        pi_1 = [-7*px, 0*px, 0];
        pf_1 = [Wchan, 0, 0];
        connect_1 = [
                     ["+x", pf_1, 0]
                    ];
        routing(pi_1, connect_1, dim);

        pi_2 = [23*px, 30*px, 0];
        pf_2 = [Wchan, 0, 0];
        connect_2 = [
                     ["+x", pf_2, 0]
                    ];
        routing(pi_2, connect_2, dim);
  
        pi_3 = [0, 0, 0];
        pf_3 = [42.4*px, 0, 0];
        connect_3 = [
                     ["+x", pf_3, 0]
                    ];
        rotate(45)
        routing(pi_3, connect_3, dim);  
        
    }
    
    if (orientation == "N"){
        translate([30*px + xpos*px, 30*px + ypos*px, zpos*layer])
        obj();
    }
    if (orientation == "FN"){
        mirror()
        translate([-2*30*px - xpos*px, 30*px + ypos*px, zpos*layer])
        obj();
    }
    if (orientation == "FS"){
        mirror([0, 1, 0])
        translate([30*px + xpos*px, -2*30*px - ypos*px, zpos*layer])
        obj();
    }
    if (orientation == "S"){
        mirror()
        mirror([0, 1, 0])
        translate([-2*30*px - xpos*px, -2*30*px - ypos*px, zpos*layer])
        obj();
    }
    
}
module junction_25px_0(xpos, ypos, zpos, orientation)
{
      
    // Channel Dimensions
    hchan = 10*layer;
    Wchan = 14*px;

    dim  = [
            [[0,0],[-Wchan/2,Wchan/2],[0,hchan]], // 0
            [[-Wchan/2,Wchan/2],[0,0],[0,hchan]], // 1
                    
           ];
    
    module obj(){
        pi_0 = [-7*px, 25*px, 0];
        pf_0 = [Wchan+11*px, 0, 0];
        connect_0 = [
                     ["+x", pf_0, 0]
                    ];
        routing(pi_0, connect_0, dim);
        
        pi_1 = [-7*px, 0*px, 0];
        pf_1 = [Wchan, 0, 0];
        connect_1 = [
                     ["+x", pf_1, 0]
                    ];
        routing(pi_1, connect_1, dim);

        pi_2 = [18*px, 25*px, 0];
        pf_2 = [Wchan, 0, 0];
        connect_2 = [
                     ["+x", pf_2, 0]
                    ];
        routing(pi_2, connect_2, dim);
  
        pi_3 = [0, 0, 0];
        pf_3 = [35.4*px, 0, 0];
        connect_3 = [
                     ["+x", pf_3, 0]
                    ];
        rotate(45)
        routing(pi_3, connect_3, dim);  
        
    }
    
    if (orientation == "FN"){
        translate([25*px + xpos*px, 25*px + ypos*px, zpos*layer])
        obj();
    }
    if (orientation == "N"){
        mirror()
        translate([-2*25*px - xpos*px, 25*px + ypos*px, zpos*layer])
        obj();
    }
    if (orientation == "S"){
        mirror([0, 1, 0])
        translate([25*px + xpos*px, -2*25*px - ypos*px, zpos*layer])
        obj();
    }
    if (orientation == "FS"){
        mirror()
        mirror([0, 1, 0])
        translate([-2*25*px - xpos*px, -2*25*px - ypos*px, zpos*layer])
        obj();
    }
    
}
module marker(xpos, ypos, zpos)
{
    marker_height = 80*layer;
    marker_diameter = 200*px;
    
    module obj(){
        cylinder(h = marker_height, d = marker_diameter);
    }

    translate([xpos, ypos, zpos]){
        obj();
    }
}
module empty_obj(str_obj)
{
    
}
module pinhole_325px_0(xpos, ypos, zpos, orientation)
{
    
    // Parameters
    d_pin   = 140*px;   // ~= 106*layer = 1.06mm;
    l_pin   = 260*px;   // ~= 2.00mm
    h_cone  = 67*px;    // ~= 0.46mm
    
    module obj(){
        rotate([-90, 0, 0]){
            translate([0, 0, l_pin]){
                cylinder(h = h_cone, d1 = d_pin, d2 = 0);
            }
        cylinder(d = d_pin, h = l_pin);
        }
    }
    
    if (orientation == "bottom"){
        translate([xpos*px, ypos*px, zpos*layer + 5 * layer])
        obj();
    }
    
    if (orientation == "left"){
        rotate([0, 0, -90])
        translate([-ypos*px, xpos*px, zpos*layer + 5 * layer])
        obj();
    }
    
    if (orientation == "top"){
        rotate([0, 0, -180])
        translate([-xpos*px, -ypos*px, zpos*layer + 5 * layer])
        obj();
    }
    
    if (orientation == "right"){
        rotate([0, 0, 90])
        translate([ypos*px, -xpos*px, zpos*layer+ 5 * layer])
        obj();
    }

}
module interconnect_32channel(xpos, ypos, zpos)
{
    gasket_side_length = 40*px;
    gasket_aperture_length = 20*px;
    gasket_height = 1*layer;

    gasket_grid = [2, 2];
    block_gasket_offset = 155*px;
    block_height_default = 200*layer;
    block_long_side = 600*px;
    block_short_side = 399*px;
    gasket_offset = 50*px;

    pedestal_x = 780*px;
    pedestal_y = 380*px;
    pedestal_height = 100*px;

    channel_width_thick = 20 * px;
    channel_width_default = 12*px;

    module zchan(l, xy = channel_width_default) {
        color("lightblue")
        translate([-xy / 2, -xy / 2, 0]) {
            if (l < 0)
                mirror([0, 0, 1])
            cube([xy, xy, -l]);
            else
            cube([xy, xy, l]);
        }
    }

    module gasket(
        gasket_side_length=gasket_side_length, 
        aperture_side_length=gasket_aperture_length, 
        height=gasket_height
        ){

            gasket_width = (gasket_side_length - aperture_side_length)/2;
            difference(){
                cube([gasket_side_length, gasket_side_length, height]);
                translate([gasket_width, gasket_width, 0])
                    cube([aperture_side_length, aperture_side_length, height]);
        }
    }

    module interconnect(
        gasket_grid=gasket_grid,
        gasket_side_length=gasket_side_length, 
        aperture_side_length=gasket_aperture_length, 
        gasket_height=gasket_height,
        gasket_offset = gasket_offset,
        block_gasket_offset=block_gasket_offset,
        block_height=block_height_default,
        block_long_side=block_long_side,
        block_short_side=block_short_side,
        ccim=false, // Flag to use the CCIM type of microgasket (SIM is the default)
        for_interface_chip=false // Interface chips are printed upside down for the burning layers to not clog entrance channels, also the gasket grid is displayed transparent
        ){
        gasket_group_x_lenght = gasket_grid[1] * gasket_side_length + (gasket_grid[1]-1) * gasket_offset;
        gasket_group_y_lenght = gasket_grid[0] * gasket_side_length + (gasket_grid[0]-1) * gasket_offset;
        x_centering_offset = gasket_group_x_lenght/2;
        y_centering_offset = gasket_group_y_lenght/2;
        if (ccim){
            cube([1, 1, 1]); // This section should implement an interconnect structure that uses SSIMs instead of SIMs (see 2018 paper for reference)
        }
        else {
            flip_angle = for_interface_chip ? 180:0;
            diff_interface_blocks = for_interface_chip ? 0:50*layer;
            rotate([flip_angle, 0, 0]){
                // Gasket grid
                translate([-x_centering_offset, -y_centering_offset, 0]){
                    for (row=[0:gasket_grid[1]-1]){
                        for (col=[0:gasket_grid[0]-1]){
                            translate([(gasket_side_length + gasket_offset)*row, (gasket_side_length + gasket_offset)*col, 0])
                            if (for_interface_chip){
                                %gasket(gasket_side_length=gasket_side_length, aperture_side_length=aperture_side_length, height=gasket_height);
                            }
                            else {
                                gasket(gasket_side_length=gasket_side_length, aperture_side_length=aperture_side_length, height=gasket_height);
                            }
                        }
                    }
                }
                // Right block
                translate([x_centering_offset + block_gasket_offset, -block_long_side/2, -pedestal_height])
                    cube([block_short_side, block_long_side, block_height - diff_interface_blocks]);
                // Left block
                translate([-x_centering_offset - block_gasket_offset - block_short_side, -block_long_side/2, -pedestal_height])
                    cube([block_short_side, block_long_side, block_height - diff_interface_blocks]);
            }
        }
    }

    module corner_connections(){
        for (row=[0.5, 1.5]) {
            for (col=[-0.5, -1.5, -2.5, -3.5]) {
                x_offset_outchan = col*gasket_side_length + col*gasket_offset;
                y_offset_outchan = row*gasket_side_length + row*gasket_offset;
                translate([x_offset_outchan, y_offset_outchan, 0])
                    zchan(pedestal_height+gasket_height, xy=channel_width_thick);
            }
        }
    }

    module obj(){
        difference(){
            translate([-pedestal_x/2, -pedestal_y/2, 0])
                cube([pedestal_x, pedestal_y, pedestal_height]);
            corner_connections();
            translate([4*(gasket_side_length+gasket_offset), 0, 0]){
                corner_connections();
            }
            translate([0, -2*(gasket_side_length+gasket_offset), 0]){
                corner_connections();
            }
            translate([4*(gasket_side_length+gasket_offset), -2*(gasket_side_length+gasket_offset), 0]){
                corner_connections();
            }
        }

        translate([0, 0, pedestal_height])
            interconnect(gasket_grid=[4, 8], for_interface_chip=false);
        }

    translate([xpos*px, ypos*px, zpos*layer]){
        obj();
    }
        
}
